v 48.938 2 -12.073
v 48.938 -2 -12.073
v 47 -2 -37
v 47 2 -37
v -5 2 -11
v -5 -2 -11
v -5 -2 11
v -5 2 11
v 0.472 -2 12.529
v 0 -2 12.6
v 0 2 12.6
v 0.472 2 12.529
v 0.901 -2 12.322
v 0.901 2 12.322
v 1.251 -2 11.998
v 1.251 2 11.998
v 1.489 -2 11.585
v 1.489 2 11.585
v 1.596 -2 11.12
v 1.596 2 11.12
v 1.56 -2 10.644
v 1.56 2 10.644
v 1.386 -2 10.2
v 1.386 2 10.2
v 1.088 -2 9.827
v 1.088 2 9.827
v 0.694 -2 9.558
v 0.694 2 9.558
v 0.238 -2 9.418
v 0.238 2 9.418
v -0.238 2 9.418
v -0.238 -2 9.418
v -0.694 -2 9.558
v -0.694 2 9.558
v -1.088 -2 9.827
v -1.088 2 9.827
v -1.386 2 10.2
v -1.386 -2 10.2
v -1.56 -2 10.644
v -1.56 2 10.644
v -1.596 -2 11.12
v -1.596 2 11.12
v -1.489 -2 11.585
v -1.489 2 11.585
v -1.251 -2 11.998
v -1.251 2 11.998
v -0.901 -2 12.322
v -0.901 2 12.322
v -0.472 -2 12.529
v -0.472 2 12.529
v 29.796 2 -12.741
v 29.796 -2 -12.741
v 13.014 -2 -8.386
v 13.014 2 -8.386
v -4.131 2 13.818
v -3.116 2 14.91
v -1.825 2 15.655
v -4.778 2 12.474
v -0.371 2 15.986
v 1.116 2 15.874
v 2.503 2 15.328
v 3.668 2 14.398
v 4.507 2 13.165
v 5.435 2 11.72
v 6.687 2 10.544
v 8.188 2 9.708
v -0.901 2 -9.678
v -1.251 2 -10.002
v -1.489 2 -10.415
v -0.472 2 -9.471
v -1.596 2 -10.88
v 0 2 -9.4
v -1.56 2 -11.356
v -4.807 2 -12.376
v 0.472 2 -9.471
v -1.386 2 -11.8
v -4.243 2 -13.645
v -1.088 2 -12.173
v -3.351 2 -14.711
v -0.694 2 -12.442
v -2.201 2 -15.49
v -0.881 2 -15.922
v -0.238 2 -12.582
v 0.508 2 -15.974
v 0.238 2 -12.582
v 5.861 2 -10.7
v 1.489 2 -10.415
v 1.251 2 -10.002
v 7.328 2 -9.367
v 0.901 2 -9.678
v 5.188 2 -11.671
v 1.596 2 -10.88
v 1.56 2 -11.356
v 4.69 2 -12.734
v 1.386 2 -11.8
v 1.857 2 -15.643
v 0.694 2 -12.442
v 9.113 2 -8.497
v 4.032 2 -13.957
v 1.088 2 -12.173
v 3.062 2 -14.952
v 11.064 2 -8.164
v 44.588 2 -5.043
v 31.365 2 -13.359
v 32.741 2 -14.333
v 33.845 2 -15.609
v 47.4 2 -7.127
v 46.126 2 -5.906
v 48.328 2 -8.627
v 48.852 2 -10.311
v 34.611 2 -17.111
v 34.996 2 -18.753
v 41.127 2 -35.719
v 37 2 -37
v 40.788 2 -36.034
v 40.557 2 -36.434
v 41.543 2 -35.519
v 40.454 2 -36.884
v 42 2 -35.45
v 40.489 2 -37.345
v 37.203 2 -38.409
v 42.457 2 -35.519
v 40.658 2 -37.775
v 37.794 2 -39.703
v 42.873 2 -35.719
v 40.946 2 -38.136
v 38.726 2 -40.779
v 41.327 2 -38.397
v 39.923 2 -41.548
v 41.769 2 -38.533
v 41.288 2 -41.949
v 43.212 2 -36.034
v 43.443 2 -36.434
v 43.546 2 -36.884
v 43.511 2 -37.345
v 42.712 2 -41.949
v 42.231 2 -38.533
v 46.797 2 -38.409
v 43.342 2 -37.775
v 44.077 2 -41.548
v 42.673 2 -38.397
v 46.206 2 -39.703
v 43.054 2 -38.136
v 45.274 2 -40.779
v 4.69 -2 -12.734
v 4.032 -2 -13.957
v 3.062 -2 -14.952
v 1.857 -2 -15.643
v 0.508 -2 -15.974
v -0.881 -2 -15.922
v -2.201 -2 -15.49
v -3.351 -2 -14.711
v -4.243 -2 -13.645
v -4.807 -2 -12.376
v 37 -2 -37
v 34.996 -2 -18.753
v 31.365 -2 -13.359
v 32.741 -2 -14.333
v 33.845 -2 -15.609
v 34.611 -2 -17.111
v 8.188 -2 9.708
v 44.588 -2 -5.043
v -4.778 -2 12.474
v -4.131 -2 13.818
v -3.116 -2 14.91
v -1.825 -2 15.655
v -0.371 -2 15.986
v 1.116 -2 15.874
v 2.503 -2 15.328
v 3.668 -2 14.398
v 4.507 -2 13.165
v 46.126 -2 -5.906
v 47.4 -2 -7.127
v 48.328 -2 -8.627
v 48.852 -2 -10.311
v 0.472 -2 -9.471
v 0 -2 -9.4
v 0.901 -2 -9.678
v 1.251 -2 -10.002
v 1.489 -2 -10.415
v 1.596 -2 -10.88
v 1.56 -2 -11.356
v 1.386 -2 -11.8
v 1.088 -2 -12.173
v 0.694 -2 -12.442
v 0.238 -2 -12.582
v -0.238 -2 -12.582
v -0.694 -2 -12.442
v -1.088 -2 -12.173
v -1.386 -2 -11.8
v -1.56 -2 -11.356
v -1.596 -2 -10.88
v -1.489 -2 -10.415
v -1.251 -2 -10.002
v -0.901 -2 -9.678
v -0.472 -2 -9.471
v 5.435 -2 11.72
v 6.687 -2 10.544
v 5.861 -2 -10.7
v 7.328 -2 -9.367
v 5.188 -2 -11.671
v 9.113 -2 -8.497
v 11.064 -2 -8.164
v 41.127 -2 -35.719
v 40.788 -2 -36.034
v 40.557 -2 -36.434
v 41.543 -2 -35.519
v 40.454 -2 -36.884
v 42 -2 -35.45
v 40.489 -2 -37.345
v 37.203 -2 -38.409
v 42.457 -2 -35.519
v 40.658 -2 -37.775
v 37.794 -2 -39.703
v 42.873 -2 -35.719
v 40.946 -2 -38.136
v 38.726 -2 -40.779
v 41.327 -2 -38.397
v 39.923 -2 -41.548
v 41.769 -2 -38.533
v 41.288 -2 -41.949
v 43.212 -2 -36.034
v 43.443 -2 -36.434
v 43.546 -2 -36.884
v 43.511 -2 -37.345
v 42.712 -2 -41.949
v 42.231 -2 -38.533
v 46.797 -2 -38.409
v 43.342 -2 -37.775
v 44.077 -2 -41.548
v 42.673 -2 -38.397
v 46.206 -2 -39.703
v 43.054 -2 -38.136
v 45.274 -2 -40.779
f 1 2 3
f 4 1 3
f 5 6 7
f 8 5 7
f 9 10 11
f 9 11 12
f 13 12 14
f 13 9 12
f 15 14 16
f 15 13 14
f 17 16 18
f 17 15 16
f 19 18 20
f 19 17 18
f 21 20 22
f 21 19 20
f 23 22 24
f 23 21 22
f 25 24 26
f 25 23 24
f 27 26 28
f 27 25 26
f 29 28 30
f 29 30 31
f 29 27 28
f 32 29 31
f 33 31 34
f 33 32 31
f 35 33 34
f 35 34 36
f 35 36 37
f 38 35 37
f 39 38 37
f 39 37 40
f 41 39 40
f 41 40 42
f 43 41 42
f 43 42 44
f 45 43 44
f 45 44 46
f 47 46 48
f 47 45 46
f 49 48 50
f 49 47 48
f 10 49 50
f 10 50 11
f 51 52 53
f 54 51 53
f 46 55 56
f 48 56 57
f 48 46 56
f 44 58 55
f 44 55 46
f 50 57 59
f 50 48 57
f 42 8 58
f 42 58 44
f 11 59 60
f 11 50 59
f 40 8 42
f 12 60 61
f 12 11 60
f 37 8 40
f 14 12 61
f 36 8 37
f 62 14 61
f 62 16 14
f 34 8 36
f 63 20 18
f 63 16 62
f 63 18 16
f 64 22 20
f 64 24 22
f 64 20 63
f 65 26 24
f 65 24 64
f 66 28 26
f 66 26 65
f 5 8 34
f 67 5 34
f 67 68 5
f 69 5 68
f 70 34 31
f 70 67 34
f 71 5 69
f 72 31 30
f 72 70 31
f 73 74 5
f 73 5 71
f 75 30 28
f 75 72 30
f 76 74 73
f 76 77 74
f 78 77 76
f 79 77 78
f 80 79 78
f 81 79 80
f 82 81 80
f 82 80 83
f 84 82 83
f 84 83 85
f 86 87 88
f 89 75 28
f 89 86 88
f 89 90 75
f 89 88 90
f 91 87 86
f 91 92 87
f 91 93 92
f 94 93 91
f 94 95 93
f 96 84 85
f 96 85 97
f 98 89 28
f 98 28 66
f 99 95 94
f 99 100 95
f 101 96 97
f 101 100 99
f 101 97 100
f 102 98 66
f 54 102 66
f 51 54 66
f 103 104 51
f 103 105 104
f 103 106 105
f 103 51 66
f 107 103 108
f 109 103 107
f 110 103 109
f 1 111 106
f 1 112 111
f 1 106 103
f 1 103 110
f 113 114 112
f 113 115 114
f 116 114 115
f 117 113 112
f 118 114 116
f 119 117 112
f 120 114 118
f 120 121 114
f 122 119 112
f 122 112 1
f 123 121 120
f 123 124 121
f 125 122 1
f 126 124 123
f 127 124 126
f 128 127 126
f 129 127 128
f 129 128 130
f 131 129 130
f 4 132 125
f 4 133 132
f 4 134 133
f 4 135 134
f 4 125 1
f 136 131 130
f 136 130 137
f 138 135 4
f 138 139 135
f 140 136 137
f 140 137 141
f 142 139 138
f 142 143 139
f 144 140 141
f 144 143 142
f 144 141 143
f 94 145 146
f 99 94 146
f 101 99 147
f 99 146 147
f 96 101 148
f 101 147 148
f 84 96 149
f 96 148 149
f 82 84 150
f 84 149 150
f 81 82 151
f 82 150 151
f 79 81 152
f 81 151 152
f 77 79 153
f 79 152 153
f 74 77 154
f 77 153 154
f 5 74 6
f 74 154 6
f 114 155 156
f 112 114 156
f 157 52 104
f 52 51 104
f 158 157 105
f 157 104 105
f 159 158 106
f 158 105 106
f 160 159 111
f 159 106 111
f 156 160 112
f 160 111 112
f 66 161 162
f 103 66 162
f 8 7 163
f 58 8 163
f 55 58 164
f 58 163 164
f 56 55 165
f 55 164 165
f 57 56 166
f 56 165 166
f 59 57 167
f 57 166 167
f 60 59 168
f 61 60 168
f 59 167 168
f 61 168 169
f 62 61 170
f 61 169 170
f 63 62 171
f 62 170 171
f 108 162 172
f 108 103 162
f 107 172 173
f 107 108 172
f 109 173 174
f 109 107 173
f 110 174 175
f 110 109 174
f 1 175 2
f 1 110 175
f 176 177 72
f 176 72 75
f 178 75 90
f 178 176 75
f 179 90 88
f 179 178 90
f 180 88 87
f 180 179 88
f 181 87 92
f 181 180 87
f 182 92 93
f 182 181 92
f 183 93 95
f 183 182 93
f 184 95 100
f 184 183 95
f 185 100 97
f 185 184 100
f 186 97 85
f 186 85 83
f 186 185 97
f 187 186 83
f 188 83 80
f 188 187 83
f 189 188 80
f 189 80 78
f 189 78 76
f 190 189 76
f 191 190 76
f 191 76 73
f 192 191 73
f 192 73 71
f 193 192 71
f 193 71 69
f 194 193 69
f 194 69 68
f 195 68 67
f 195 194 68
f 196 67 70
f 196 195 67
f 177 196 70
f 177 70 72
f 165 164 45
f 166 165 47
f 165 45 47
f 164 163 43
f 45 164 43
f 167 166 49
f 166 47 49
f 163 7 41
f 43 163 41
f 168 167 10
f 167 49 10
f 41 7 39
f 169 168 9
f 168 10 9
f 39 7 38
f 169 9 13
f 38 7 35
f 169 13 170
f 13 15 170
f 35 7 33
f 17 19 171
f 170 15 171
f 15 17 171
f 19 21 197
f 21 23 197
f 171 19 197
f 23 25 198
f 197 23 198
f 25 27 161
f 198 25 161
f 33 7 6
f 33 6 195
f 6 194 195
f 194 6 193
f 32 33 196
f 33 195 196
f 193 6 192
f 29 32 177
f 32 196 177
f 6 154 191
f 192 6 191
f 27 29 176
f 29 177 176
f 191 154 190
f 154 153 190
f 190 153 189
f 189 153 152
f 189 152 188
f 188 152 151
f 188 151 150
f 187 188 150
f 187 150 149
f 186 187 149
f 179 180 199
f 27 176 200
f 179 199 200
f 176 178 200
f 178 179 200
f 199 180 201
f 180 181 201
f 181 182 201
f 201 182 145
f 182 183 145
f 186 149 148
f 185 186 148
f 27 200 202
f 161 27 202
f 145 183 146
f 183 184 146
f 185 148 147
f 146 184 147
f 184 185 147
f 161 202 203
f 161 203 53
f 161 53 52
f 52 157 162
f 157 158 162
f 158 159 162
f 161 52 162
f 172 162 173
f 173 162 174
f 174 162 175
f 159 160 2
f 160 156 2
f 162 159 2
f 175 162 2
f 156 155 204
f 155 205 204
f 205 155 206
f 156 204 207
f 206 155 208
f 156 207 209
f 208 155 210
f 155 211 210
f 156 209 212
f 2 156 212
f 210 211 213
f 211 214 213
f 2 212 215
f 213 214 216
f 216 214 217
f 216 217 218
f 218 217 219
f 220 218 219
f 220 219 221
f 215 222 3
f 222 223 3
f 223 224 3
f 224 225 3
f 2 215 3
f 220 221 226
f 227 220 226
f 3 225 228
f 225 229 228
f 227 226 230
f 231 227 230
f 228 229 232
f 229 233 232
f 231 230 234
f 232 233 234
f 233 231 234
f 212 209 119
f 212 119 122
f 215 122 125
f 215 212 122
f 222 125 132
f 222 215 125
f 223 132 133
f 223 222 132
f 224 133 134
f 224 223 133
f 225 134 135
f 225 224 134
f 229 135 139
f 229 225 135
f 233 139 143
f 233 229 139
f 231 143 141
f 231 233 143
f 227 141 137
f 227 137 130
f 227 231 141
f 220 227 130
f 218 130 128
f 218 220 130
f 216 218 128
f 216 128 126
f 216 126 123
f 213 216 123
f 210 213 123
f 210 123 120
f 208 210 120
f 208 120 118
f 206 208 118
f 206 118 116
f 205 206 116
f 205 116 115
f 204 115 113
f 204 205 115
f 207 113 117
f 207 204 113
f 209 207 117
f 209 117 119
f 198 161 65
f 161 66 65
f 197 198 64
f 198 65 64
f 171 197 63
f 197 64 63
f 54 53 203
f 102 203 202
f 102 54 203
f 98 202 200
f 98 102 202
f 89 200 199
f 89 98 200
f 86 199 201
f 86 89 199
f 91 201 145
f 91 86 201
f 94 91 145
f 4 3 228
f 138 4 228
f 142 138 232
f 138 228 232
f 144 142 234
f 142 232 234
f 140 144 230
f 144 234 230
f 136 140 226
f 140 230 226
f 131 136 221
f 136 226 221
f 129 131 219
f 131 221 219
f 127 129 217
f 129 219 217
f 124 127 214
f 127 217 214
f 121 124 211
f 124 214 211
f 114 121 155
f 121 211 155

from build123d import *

# Parameters (mm, degrees)
BOSS_EXTRUDE1_DEPTH      = 2
BOSS_EXTRUDE1_DEPTH_BACK = 2
SKETCH1_R                = 1.6
BOSS_EXTRUDE3_DEPTH      = 2
BOSS_EXTRUDE3_DEPTH_BACK = 2
SKETCH3_R                = 1.55
FILLET1_R                = 7


with BuildPart() as part:
    # Sketch1 → Boss-Extrude1 (new, two sides: drawn at the far end of the back side and taken through both)
    with BuildSketch(Plane(origin=(0, 0, 0), x_dir=(1, 0, 0), z_dir=(0, 1, 0)).offset(-BOSS_EXTRUDE1_DEPTH_BACK)):
        with BuildLine():
            Line((5, -11), (5, 11))
            ThreePointArc((5, 11), (0, 16), (-5, 11))
            Line((-5, 11), (-5, -11))
            ThreePointArc((-5, -11), (0, -16), (5, -11))
        make_face()
        with Locations((0, 11)):
            Circle(SKETCH1_R, mode=Mode.SUBTRACT)
        with Locations((0, -11)):
            Circle(SKETCH1_R, mode=Mode.SUBTRACT)
    extrude(amount=BOSS_EXTRUDE1_DEPTH + BOSS_EXTRUDE1_DEPTH_BACK)

    # Sketch3 → Boss-Extrude3 (add, two sides: drawn at the far end of the back side and taken through both)
    with BuildSketch(Plane(origin=(0, 0, 0), x_dir=(1, 0, 0), z_dir=(0, 1, 0)).offset(-BOSS_EXTRUDE3_DEPTH_BACK)):
        with BuildLine():
            Line((34.468399727, 13.95420099), (5, 6.305712988))
            Line((5, 6.305712988), (5, -11))
            Line((5, -11), (49.334489528, 6.966618691))
            Line((49.334489528, 6.966618691), (47, 37))
            ThreePointArc((47, 37), (42, 42), (37, 37))
            Line((37, 37), (34.468399727, 13.95420099))
        make_face()
        with Locations((42, 37)):
            Circle(SKETCH3_R, mode=Mode.SUBTRACT)
    extrude(amount=BOSS_EXTRUDE3_DEPTH + BOSS_EXTRUDE3_DEPTH_BACK)

    # Fillet1
    fillet1_edges = [part.edges().sort_by_distance(p)[0] for p in [
        (5, 0, 11),
        (49.334489528, 0, -6.966618691),
        (34.468399727, 0, -13.95420099),
        (5, 0, -6.305712988),
    ]]
    fillet(fillet1_edges, radius=FILLET1_R)


solid = part.part
